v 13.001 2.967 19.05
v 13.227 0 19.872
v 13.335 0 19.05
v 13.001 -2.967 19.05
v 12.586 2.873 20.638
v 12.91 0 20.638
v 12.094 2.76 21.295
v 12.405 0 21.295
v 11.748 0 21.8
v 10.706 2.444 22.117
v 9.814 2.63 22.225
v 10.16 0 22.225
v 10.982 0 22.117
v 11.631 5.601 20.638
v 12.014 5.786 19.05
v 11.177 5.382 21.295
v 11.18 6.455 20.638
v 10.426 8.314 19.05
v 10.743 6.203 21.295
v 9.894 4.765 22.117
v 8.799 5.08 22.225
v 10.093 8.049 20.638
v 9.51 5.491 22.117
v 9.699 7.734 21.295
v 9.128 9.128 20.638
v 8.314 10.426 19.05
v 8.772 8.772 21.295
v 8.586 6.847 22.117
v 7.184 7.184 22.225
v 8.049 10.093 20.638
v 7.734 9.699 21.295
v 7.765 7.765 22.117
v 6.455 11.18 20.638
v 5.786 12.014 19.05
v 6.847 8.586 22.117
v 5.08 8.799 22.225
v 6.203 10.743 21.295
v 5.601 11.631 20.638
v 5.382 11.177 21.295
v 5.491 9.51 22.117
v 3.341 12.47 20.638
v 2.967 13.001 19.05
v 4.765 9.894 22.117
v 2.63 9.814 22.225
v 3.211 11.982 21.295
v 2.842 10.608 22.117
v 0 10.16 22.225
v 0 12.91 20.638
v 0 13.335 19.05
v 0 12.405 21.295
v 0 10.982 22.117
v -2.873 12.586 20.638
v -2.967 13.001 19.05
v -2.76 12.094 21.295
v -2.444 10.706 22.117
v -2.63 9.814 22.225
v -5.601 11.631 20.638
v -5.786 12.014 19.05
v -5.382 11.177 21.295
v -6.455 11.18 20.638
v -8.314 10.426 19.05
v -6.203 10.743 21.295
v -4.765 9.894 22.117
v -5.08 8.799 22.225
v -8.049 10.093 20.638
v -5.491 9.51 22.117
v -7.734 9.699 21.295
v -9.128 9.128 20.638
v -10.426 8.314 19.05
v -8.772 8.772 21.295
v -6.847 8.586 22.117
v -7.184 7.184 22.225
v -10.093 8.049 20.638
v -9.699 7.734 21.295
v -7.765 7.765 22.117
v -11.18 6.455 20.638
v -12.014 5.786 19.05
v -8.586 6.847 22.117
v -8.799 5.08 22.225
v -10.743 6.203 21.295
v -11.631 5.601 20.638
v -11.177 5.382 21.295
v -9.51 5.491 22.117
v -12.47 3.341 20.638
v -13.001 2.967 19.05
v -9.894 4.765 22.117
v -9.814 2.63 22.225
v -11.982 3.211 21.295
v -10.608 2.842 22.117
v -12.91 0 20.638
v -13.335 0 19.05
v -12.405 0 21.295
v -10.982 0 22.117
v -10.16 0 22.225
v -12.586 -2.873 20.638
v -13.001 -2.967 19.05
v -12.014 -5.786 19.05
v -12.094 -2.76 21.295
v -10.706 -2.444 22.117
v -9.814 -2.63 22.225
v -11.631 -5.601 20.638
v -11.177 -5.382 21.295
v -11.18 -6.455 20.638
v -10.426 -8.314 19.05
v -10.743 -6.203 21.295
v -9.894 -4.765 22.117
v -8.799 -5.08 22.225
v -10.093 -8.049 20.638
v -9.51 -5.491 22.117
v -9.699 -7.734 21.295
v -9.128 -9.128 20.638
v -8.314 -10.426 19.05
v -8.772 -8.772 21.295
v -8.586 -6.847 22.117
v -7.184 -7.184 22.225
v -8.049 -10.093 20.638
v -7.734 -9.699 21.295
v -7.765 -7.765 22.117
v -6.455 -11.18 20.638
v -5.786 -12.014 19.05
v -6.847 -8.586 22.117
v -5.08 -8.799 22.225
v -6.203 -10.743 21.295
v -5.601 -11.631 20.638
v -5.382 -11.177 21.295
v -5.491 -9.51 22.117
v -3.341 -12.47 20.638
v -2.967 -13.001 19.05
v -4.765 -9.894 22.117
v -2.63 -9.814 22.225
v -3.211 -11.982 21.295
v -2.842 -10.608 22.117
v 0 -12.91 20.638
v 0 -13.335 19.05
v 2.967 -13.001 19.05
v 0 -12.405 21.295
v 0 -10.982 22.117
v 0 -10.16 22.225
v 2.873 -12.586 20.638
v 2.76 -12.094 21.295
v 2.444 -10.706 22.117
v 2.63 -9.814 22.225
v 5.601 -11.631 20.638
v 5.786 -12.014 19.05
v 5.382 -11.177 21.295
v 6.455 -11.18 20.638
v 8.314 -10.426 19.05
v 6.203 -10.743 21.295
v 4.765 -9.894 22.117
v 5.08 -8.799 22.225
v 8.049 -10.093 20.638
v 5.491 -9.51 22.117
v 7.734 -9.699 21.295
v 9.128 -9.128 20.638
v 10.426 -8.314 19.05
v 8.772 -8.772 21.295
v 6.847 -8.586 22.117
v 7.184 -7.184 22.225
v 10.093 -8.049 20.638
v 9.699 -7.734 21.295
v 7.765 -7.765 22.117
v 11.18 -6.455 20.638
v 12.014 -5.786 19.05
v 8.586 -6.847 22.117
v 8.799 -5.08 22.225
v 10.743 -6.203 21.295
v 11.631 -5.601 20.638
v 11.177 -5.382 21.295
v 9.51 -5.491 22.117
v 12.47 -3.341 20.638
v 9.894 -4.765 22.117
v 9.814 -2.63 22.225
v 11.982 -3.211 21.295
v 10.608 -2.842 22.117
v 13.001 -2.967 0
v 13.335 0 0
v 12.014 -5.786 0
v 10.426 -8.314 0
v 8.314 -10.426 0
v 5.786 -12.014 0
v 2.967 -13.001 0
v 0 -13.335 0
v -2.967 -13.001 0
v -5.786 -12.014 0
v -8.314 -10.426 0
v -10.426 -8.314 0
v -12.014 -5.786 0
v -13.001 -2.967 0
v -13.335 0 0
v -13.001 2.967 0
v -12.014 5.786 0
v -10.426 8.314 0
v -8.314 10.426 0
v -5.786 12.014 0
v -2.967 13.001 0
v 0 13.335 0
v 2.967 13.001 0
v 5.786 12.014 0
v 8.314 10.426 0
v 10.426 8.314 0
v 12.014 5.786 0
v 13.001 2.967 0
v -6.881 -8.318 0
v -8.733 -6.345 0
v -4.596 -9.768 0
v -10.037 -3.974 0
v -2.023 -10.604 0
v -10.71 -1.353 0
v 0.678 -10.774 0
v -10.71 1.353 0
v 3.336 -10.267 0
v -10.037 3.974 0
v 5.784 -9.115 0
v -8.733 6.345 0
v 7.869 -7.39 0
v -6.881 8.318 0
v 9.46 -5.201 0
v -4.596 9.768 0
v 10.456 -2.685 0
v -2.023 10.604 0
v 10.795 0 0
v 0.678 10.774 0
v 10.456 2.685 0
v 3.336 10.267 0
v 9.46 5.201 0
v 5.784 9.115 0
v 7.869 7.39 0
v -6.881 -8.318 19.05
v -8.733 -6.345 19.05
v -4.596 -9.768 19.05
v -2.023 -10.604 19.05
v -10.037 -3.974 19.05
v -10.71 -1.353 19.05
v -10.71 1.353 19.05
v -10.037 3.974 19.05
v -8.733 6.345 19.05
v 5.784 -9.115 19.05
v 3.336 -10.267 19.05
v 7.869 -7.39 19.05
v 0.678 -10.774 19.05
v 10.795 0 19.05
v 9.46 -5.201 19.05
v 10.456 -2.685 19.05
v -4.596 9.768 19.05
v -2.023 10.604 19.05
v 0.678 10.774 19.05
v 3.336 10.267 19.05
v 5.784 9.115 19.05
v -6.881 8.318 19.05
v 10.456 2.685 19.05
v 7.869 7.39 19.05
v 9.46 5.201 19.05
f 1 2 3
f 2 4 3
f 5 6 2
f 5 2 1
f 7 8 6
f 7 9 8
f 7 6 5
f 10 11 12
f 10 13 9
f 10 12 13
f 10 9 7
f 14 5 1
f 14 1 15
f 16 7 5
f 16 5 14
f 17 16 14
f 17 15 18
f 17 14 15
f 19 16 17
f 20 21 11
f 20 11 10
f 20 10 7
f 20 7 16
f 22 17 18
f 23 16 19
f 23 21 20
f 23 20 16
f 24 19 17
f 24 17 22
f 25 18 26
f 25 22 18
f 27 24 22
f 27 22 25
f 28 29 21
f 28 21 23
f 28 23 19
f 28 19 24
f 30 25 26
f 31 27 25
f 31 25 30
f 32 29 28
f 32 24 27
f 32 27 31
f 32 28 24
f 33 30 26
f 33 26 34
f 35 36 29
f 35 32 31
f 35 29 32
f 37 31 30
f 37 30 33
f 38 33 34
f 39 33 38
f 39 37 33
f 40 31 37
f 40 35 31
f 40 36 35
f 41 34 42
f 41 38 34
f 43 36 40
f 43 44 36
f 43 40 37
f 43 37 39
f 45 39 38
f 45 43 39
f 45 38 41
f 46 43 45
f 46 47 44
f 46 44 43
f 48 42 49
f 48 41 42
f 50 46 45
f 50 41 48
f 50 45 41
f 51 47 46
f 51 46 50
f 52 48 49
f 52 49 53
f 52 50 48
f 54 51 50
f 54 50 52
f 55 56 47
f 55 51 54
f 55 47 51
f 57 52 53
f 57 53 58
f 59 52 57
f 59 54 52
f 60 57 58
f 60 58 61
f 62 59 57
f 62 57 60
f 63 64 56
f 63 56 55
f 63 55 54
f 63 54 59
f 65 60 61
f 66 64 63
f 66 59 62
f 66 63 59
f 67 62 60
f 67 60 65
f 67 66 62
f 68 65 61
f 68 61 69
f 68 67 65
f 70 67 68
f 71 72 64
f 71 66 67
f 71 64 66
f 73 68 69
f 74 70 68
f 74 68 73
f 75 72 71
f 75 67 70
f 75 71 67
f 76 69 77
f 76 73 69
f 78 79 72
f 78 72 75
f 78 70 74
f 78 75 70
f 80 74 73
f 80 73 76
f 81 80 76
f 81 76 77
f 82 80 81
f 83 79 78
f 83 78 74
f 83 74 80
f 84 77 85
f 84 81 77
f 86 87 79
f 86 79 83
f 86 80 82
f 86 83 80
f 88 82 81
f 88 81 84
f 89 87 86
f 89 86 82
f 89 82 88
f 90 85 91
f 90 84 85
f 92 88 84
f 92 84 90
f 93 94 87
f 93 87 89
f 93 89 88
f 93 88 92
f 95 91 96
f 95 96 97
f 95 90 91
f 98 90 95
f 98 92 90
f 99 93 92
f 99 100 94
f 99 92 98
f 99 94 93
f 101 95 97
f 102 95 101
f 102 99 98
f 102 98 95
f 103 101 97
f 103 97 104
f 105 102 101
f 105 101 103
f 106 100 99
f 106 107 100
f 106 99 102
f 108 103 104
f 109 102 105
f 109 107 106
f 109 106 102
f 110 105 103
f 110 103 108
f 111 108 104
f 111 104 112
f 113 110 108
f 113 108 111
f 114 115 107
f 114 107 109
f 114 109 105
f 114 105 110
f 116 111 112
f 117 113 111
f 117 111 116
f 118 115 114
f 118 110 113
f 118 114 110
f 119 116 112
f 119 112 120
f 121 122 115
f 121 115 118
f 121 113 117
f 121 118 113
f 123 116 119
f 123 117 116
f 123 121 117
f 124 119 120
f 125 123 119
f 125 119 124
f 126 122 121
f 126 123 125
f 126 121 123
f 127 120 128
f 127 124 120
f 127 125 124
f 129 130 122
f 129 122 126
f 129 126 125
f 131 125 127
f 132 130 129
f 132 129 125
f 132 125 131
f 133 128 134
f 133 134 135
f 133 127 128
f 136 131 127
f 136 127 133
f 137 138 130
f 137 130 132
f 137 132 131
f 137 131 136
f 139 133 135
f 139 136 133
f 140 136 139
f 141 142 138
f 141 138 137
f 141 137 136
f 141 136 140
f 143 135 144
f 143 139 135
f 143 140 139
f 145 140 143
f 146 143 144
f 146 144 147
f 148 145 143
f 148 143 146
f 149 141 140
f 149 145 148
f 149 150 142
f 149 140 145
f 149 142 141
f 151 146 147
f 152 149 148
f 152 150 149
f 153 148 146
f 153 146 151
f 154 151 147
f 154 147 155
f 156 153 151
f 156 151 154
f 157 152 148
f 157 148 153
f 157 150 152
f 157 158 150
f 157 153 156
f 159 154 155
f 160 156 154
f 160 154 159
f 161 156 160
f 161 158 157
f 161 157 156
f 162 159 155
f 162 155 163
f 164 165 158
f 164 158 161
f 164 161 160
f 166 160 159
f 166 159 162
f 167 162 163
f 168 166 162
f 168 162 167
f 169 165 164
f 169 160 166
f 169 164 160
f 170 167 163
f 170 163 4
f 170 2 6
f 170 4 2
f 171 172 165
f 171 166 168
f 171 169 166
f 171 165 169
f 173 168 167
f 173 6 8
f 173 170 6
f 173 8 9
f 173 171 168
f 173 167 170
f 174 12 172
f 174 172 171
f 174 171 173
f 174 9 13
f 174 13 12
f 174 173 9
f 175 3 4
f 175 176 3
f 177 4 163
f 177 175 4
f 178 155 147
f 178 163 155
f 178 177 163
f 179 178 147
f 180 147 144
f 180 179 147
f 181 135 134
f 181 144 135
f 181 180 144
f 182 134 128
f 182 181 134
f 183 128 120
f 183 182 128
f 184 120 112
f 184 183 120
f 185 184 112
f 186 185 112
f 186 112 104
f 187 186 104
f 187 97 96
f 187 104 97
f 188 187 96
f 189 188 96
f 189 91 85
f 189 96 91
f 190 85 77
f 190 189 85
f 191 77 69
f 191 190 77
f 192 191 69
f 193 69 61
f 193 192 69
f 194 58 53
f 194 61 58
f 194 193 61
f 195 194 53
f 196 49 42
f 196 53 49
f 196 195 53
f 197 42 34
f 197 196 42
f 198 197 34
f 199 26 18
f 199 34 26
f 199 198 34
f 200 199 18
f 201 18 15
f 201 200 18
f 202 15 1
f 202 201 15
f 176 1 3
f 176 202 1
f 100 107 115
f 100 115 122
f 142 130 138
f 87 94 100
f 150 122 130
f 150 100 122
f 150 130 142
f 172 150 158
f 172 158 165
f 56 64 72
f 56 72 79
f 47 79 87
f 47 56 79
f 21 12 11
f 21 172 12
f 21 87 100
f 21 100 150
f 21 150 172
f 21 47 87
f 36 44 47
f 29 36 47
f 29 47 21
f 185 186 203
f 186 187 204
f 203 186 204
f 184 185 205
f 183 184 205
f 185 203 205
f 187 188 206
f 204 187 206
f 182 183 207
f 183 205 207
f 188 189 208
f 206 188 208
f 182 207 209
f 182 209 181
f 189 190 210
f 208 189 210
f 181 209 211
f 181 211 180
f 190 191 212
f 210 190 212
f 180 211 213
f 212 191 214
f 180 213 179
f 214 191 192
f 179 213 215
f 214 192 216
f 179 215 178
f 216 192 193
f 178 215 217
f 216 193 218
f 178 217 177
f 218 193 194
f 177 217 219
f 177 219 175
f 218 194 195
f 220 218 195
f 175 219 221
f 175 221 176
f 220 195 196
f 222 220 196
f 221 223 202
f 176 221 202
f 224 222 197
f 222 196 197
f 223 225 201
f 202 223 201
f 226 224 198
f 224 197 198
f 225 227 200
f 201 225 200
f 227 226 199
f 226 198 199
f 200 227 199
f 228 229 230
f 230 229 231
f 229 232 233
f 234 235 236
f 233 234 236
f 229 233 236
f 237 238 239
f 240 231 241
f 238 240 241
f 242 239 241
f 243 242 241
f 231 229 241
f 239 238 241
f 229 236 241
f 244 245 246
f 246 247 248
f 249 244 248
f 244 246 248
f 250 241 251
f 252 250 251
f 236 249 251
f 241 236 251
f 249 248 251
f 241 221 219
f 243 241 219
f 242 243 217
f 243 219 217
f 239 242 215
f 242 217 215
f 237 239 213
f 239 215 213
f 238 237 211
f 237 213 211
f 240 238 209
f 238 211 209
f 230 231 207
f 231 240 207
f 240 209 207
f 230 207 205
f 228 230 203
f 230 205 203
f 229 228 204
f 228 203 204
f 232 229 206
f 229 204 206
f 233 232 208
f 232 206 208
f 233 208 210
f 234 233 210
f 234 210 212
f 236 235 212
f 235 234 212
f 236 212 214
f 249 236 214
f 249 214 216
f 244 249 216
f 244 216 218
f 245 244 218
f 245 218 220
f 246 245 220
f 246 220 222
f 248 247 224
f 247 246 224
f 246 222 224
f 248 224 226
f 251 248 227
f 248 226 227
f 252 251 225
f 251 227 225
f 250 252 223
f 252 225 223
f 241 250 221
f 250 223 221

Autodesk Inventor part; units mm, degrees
ref_plane "YZ Plane" through (0, 0, 0) normal (1, 0, 0) x (0, 1, 0)
ref_plane "XZ Plane" through (0, 0, 0) normal (0, 1, 0) x (-1, 0, 0)
ref_plane "XY Plane" through (0, 0, 0) normal (0, 0, 1) x (1, 0, 0)
sketch "Sketch1" plane through (0, 0, 0) normal (0, 0, 1) x (1, 0, 0)
  circle A0 centre (0, 0) radius 13.335
  circle A1 centre (0, 0) radius 10.795
  dimension "d0" = 26.67
  dimension "d2" = 21.59
extrude "Extrusion1" add sketch "Sketch1" along normal blind 19.05
sketch "Sketch2" plane through (0, 0, 19.05) normal (0, 0, 1) x (1, 0, 0)
  circle A0 centre (0, 0) radius 13.335 projected
extrude "Extrusion2" add sketch "Sketch2" along normal blind 3.175
fillet "Fillet1" radius 3.175 1 edges at (-13.335, 0, 22.225)
properties part number "Cap" material "PVC-Piping"
